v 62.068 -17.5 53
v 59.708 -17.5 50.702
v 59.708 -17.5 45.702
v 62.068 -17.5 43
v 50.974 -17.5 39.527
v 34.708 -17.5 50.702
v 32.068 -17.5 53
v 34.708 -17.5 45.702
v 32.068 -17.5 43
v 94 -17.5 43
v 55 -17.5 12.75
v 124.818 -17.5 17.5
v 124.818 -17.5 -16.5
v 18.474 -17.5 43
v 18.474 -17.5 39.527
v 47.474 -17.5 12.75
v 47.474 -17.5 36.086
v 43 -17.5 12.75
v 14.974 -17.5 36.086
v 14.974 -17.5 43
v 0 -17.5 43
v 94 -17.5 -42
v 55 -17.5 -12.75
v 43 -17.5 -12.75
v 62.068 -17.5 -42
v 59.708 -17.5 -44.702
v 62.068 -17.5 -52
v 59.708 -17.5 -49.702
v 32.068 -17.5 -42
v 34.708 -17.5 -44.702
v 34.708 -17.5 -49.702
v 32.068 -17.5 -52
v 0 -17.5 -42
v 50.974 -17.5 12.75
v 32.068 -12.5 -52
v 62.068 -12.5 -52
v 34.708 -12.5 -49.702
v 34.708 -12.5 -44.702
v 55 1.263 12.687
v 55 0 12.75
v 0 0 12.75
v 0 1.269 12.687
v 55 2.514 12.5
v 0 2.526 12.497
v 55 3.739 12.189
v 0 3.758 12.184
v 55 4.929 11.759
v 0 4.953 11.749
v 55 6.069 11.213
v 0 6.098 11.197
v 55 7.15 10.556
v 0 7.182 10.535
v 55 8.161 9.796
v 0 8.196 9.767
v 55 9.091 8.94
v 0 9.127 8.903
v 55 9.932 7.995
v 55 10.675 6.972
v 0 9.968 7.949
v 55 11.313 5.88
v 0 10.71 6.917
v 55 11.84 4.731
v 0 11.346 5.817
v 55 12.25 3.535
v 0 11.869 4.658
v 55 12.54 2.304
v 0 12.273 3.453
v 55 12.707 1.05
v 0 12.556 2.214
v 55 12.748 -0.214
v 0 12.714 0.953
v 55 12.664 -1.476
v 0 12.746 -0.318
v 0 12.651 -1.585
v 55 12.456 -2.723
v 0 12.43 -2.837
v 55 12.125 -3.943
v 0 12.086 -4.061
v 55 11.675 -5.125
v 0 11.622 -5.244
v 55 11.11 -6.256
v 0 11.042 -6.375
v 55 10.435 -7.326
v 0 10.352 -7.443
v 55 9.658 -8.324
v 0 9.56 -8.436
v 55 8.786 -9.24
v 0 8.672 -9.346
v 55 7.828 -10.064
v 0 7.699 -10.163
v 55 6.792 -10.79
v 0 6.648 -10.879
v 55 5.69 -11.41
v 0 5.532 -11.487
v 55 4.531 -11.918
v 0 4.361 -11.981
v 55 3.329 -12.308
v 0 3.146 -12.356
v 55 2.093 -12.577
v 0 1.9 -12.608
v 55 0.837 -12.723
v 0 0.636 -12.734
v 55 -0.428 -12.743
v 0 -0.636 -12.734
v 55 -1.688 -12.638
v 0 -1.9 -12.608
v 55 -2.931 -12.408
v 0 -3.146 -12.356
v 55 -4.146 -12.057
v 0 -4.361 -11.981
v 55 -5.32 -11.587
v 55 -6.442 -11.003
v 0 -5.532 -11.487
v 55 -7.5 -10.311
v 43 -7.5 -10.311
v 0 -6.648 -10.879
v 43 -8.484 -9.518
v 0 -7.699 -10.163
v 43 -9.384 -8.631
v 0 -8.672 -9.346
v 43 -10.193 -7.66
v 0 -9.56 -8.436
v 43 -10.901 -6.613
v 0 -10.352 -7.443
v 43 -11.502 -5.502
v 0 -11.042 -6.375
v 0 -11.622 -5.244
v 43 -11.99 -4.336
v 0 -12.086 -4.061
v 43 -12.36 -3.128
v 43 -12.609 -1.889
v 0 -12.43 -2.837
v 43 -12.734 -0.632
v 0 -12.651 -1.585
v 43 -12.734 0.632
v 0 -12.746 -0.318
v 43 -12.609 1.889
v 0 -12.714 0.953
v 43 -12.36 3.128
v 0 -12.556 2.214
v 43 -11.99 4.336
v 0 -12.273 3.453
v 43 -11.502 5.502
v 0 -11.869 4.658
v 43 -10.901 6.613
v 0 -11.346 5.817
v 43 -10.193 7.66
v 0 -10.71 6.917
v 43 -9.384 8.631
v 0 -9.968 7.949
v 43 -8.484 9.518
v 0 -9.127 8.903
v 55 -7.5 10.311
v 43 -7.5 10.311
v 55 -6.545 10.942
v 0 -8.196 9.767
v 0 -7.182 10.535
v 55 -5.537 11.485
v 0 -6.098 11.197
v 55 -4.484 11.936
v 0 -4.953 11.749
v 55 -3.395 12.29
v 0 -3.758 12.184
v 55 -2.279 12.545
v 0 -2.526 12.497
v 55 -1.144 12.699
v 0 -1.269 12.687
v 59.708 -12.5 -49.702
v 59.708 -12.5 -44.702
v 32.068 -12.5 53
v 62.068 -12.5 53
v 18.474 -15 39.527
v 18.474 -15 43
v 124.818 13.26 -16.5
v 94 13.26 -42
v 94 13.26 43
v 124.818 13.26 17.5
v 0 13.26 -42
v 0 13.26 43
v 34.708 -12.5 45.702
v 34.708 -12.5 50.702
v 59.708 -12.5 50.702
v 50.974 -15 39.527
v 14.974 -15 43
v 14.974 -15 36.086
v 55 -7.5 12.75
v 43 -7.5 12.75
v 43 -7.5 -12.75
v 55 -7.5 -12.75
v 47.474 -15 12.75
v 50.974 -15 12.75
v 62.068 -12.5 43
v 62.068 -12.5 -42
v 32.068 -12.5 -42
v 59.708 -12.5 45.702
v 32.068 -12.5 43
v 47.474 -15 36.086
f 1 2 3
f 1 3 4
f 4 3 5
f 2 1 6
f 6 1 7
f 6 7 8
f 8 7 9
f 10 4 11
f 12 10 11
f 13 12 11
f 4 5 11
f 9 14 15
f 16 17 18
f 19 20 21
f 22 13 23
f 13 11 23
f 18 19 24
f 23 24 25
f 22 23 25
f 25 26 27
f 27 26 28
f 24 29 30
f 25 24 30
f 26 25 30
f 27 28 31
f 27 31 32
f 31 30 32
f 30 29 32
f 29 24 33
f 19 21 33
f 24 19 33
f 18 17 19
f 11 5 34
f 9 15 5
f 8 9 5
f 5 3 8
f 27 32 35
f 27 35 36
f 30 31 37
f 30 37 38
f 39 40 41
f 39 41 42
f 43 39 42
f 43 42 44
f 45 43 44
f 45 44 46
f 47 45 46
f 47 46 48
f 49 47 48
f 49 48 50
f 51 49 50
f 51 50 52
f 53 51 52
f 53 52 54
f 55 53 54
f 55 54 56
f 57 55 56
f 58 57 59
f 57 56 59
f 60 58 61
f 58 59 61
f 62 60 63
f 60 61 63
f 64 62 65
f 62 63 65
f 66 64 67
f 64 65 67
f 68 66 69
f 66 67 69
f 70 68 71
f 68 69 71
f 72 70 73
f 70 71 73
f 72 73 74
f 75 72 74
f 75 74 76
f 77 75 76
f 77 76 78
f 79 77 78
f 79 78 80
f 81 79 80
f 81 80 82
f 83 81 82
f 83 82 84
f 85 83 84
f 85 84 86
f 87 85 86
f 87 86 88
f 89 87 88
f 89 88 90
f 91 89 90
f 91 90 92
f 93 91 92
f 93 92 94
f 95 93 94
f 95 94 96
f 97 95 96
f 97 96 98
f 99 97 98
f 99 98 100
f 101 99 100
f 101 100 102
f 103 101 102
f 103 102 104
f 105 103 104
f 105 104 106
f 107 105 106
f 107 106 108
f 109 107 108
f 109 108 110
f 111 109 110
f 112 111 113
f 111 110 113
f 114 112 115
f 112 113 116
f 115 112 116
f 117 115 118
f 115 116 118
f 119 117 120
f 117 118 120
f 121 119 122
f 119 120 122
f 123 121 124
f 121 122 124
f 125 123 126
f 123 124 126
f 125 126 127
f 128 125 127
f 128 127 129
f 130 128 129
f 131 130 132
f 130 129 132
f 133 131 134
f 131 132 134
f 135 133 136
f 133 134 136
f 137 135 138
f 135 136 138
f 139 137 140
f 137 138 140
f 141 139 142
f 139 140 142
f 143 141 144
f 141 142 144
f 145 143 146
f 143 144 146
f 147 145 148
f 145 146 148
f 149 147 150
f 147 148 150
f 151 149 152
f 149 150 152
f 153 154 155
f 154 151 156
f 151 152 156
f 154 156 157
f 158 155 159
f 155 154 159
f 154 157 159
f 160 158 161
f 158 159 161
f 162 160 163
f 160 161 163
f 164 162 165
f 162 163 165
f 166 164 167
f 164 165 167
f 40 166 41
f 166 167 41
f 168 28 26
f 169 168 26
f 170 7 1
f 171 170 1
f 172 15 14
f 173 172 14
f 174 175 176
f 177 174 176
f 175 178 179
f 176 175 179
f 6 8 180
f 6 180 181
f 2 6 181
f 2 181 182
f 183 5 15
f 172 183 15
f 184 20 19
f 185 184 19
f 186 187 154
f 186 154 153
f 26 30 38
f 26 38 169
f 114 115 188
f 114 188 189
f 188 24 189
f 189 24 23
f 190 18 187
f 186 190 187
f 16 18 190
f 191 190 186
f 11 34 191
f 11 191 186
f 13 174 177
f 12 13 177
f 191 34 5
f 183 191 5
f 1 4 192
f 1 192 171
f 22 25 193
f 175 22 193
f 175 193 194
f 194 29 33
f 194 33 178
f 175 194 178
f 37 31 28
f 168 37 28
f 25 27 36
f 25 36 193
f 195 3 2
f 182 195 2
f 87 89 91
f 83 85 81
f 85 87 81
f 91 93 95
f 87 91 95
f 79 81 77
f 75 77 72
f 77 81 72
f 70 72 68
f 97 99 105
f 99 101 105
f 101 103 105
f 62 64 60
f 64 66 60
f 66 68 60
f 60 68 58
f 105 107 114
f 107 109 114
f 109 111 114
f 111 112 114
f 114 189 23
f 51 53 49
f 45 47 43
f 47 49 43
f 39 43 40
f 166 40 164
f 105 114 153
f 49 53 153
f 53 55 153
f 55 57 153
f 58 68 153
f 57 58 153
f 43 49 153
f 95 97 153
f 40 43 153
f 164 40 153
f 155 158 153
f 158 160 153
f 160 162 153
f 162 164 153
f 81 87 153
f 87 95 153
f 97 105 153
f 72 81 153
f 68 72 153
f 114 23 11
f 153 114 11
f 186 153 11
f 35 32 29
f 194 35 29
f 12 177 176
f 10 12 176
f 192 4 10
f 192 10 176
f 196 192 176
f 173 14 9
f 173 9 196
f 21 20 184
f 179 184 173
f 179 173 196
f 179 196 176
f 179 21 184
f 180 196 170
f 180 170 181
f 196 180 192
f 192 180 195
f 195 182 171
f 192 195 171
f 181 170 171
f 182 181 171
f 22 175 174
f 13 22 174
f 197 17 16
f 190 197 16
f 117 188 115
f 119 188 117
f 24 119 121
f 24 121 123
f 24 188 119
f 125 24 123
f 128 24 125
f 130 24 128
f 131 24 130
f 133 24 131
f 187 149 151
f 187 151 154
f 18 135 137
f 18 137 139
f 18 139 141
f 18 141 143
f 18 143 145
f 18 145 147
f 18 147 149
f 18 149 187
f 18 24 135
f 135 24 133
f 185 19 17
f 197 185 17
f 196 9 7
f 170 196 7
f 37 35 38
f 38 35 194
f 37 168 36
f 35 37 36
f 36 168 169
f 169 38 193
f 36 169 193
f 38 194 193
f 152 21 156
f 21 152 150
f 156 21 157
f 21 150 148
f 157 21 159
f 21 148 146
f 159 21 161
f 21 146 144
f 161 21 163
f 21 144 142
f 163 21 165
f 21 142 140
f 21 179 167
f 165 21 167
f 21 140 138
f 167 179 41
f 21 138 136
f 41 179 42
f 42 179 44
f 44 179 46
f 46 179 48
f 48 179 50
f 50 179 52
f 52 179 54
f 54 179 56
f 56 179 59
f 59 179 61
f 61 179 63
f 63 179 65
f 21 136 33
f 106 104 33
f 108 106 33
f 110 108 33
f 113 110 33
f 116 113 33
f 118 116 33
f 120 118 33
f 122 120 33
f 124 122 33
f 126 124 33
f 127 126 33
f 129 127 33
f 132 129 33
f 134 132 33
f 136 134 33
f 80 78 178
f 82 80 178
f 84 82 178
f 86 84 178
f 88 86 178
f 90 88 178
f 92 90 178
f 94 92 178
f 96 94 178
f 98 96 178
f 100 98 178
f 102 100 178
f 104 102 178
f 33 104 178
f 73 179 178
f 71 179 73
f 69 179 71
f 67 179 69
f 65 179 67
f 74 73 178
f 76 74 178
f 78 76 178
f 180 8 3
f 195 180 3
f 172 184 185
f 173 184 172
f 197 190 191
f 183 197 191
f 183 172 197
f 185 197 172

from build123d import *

# Parameters (mm, degrees)
SKETCH1_W           = 85
SKETCH1_H           = 35
BOSS_EXTRUDE1_DEPTH = 145.5
SKETCH4_R           = 12.75
CUT_EXTRUDE2_DEPTH  = 55
CUT_EXTRUDE3_DEPTH  = 156.705651792
SKETCH11_W          = 12
SKETCH11_H          = 25.5
CUT_EXTRUDE5_DEPTH  = 10
CUT_EXTRUDE6_DEPTH  = 2.5
SKETCH14_W          = 30
SKETCH14_H          = 10
SKETCH14_W_2        = 25
SKETCH14_H_2        = 5
BOSS_EXTRUDE2_DEPTH = 5
CUT_EXTRUDE12_REACH = 138.729
SKETCH16_W          = 85
SKETCH16_H          = 4.239608998


with BuildPart() as part:
    # Sketch1 → Boss-Extrude1 (new body)
    with BuildSketch(Plane(origin=(0, 0, 0), x_dir=(0, 0, -1), z_dir=(1, 0, 0))):
        with Locations((-0.5, 0)):
            Rectangle(SKETCH1_W, SKETCH1_H)
    extrude(amount=BOSS_EXTRUDE1_DEPTH)

    # Sketch4 → Cut-Extrude2 (cut)
    with BuildSketch(Plane.ZY):
        Circle(SKETCH4_R)
    extrude(amount=-CUT_EXTRUDE2_DEPTH, mode=Mode.SUBTRACT)

    # Sketch9 → Cut-Extrude3 (cut, through all)
    with BuildSketch(Plane(origin=(0, 17.5, 0), x_dir=(1, 0, 0), z_dir=(0, 1, 0))):
        Polygon((145.5, 42), (94, 42), (124.818014212, 16.5), (124.818014212, -17.5), (94, -43), (145.5, -43), align=None)
    extrude(amount=-CUT_EXTRUDE3_DEPTH, mode=Mode.SUBTRACT)

    # Sketch11 → Cut-Extrude5 (cut)
    with BuildSketch(Plane.XZ.offset(17.5)):
        with Locations((49, 0)):
            Rectangle(SKETCH11_W, SKETCH11_H)
    extrude(amount=-CUT_EXTRUDE5_DEPTH, mode=Mode.SUBTRACT)

    # Sketch12 → Cut-Extrude6 (cut)
    with BuildSketch(Plane.XZ.offset(17.5)):
        Polygon((50.974497594, 39.527447374), (48.784580707, 39.527447374), (18.473843114, 39.527447374), (18.473843114, 43), (14.973843114, 43), (14.973843114, 39.527447374), (14.973843114, 36.086149409), (47.474497594, 36.086149409), (47.474497594, 12.75), (50.974497594, 12.75), (50.974497594, 36.086149409), align=None)
    extrude(amount=-CUT_EXTRUDE6_DEPTH, mode=Mode.SUBTRACT)

    # Sketch14 → Boss-Extrude2 (add)
    # profile 1 of 2: a face of its own
    with BuildSketch(Plane.XZ.offset(17.5)):
        with Locations((47.067654603, -47)):
            Rectangle(SKETCH14_W, SKETCH14_H)
        with Locations((47.207687623, -47.202155092)):
            Rectangle(SKETCH14_W_2, SKETCH14_H_2, mode=Mode.SUBTRACT)
    # profile 2 of 2: a face of its own
    with BuildSketch(Plane.XZ.offset(17.5)):
        with Locations((47.067654603, 48)):
            Rectangle(SKETCH14_W, SKETCH14_H)
        with Locations((47.207687623, 48.202155092)):
            Rectangle(SKETCH14_W_2, SKETCH14_H_2, mode=Mode.SUBTRACT)
    extrude(amount=-BOSS_EXTRUDE2_DEPTH)

    # Sketch16 → Cut-Extrude12 (cut, up to next)
    with BuildSketch(Plane.ZY, mode=Mode.PRIVATE) as cut_extrude12_sk1:
        with Locations((0.5, 15.380195501)):
            Rectangle(SKETCH16_W, SKETCH16_H)
    cut_extrude12_tool1 = extrude(cut_extrude12_sk1.sketch, amount=-CUT_EXTRUDE12_REACH, mode=Mode.PRIVATE) & part.part
    add(cut_extrude12_tool1.solids().sort_by_distance((0, 15.380196, 0.5))[0], mode=Mode.SUBTRACT)


solid = part.part
